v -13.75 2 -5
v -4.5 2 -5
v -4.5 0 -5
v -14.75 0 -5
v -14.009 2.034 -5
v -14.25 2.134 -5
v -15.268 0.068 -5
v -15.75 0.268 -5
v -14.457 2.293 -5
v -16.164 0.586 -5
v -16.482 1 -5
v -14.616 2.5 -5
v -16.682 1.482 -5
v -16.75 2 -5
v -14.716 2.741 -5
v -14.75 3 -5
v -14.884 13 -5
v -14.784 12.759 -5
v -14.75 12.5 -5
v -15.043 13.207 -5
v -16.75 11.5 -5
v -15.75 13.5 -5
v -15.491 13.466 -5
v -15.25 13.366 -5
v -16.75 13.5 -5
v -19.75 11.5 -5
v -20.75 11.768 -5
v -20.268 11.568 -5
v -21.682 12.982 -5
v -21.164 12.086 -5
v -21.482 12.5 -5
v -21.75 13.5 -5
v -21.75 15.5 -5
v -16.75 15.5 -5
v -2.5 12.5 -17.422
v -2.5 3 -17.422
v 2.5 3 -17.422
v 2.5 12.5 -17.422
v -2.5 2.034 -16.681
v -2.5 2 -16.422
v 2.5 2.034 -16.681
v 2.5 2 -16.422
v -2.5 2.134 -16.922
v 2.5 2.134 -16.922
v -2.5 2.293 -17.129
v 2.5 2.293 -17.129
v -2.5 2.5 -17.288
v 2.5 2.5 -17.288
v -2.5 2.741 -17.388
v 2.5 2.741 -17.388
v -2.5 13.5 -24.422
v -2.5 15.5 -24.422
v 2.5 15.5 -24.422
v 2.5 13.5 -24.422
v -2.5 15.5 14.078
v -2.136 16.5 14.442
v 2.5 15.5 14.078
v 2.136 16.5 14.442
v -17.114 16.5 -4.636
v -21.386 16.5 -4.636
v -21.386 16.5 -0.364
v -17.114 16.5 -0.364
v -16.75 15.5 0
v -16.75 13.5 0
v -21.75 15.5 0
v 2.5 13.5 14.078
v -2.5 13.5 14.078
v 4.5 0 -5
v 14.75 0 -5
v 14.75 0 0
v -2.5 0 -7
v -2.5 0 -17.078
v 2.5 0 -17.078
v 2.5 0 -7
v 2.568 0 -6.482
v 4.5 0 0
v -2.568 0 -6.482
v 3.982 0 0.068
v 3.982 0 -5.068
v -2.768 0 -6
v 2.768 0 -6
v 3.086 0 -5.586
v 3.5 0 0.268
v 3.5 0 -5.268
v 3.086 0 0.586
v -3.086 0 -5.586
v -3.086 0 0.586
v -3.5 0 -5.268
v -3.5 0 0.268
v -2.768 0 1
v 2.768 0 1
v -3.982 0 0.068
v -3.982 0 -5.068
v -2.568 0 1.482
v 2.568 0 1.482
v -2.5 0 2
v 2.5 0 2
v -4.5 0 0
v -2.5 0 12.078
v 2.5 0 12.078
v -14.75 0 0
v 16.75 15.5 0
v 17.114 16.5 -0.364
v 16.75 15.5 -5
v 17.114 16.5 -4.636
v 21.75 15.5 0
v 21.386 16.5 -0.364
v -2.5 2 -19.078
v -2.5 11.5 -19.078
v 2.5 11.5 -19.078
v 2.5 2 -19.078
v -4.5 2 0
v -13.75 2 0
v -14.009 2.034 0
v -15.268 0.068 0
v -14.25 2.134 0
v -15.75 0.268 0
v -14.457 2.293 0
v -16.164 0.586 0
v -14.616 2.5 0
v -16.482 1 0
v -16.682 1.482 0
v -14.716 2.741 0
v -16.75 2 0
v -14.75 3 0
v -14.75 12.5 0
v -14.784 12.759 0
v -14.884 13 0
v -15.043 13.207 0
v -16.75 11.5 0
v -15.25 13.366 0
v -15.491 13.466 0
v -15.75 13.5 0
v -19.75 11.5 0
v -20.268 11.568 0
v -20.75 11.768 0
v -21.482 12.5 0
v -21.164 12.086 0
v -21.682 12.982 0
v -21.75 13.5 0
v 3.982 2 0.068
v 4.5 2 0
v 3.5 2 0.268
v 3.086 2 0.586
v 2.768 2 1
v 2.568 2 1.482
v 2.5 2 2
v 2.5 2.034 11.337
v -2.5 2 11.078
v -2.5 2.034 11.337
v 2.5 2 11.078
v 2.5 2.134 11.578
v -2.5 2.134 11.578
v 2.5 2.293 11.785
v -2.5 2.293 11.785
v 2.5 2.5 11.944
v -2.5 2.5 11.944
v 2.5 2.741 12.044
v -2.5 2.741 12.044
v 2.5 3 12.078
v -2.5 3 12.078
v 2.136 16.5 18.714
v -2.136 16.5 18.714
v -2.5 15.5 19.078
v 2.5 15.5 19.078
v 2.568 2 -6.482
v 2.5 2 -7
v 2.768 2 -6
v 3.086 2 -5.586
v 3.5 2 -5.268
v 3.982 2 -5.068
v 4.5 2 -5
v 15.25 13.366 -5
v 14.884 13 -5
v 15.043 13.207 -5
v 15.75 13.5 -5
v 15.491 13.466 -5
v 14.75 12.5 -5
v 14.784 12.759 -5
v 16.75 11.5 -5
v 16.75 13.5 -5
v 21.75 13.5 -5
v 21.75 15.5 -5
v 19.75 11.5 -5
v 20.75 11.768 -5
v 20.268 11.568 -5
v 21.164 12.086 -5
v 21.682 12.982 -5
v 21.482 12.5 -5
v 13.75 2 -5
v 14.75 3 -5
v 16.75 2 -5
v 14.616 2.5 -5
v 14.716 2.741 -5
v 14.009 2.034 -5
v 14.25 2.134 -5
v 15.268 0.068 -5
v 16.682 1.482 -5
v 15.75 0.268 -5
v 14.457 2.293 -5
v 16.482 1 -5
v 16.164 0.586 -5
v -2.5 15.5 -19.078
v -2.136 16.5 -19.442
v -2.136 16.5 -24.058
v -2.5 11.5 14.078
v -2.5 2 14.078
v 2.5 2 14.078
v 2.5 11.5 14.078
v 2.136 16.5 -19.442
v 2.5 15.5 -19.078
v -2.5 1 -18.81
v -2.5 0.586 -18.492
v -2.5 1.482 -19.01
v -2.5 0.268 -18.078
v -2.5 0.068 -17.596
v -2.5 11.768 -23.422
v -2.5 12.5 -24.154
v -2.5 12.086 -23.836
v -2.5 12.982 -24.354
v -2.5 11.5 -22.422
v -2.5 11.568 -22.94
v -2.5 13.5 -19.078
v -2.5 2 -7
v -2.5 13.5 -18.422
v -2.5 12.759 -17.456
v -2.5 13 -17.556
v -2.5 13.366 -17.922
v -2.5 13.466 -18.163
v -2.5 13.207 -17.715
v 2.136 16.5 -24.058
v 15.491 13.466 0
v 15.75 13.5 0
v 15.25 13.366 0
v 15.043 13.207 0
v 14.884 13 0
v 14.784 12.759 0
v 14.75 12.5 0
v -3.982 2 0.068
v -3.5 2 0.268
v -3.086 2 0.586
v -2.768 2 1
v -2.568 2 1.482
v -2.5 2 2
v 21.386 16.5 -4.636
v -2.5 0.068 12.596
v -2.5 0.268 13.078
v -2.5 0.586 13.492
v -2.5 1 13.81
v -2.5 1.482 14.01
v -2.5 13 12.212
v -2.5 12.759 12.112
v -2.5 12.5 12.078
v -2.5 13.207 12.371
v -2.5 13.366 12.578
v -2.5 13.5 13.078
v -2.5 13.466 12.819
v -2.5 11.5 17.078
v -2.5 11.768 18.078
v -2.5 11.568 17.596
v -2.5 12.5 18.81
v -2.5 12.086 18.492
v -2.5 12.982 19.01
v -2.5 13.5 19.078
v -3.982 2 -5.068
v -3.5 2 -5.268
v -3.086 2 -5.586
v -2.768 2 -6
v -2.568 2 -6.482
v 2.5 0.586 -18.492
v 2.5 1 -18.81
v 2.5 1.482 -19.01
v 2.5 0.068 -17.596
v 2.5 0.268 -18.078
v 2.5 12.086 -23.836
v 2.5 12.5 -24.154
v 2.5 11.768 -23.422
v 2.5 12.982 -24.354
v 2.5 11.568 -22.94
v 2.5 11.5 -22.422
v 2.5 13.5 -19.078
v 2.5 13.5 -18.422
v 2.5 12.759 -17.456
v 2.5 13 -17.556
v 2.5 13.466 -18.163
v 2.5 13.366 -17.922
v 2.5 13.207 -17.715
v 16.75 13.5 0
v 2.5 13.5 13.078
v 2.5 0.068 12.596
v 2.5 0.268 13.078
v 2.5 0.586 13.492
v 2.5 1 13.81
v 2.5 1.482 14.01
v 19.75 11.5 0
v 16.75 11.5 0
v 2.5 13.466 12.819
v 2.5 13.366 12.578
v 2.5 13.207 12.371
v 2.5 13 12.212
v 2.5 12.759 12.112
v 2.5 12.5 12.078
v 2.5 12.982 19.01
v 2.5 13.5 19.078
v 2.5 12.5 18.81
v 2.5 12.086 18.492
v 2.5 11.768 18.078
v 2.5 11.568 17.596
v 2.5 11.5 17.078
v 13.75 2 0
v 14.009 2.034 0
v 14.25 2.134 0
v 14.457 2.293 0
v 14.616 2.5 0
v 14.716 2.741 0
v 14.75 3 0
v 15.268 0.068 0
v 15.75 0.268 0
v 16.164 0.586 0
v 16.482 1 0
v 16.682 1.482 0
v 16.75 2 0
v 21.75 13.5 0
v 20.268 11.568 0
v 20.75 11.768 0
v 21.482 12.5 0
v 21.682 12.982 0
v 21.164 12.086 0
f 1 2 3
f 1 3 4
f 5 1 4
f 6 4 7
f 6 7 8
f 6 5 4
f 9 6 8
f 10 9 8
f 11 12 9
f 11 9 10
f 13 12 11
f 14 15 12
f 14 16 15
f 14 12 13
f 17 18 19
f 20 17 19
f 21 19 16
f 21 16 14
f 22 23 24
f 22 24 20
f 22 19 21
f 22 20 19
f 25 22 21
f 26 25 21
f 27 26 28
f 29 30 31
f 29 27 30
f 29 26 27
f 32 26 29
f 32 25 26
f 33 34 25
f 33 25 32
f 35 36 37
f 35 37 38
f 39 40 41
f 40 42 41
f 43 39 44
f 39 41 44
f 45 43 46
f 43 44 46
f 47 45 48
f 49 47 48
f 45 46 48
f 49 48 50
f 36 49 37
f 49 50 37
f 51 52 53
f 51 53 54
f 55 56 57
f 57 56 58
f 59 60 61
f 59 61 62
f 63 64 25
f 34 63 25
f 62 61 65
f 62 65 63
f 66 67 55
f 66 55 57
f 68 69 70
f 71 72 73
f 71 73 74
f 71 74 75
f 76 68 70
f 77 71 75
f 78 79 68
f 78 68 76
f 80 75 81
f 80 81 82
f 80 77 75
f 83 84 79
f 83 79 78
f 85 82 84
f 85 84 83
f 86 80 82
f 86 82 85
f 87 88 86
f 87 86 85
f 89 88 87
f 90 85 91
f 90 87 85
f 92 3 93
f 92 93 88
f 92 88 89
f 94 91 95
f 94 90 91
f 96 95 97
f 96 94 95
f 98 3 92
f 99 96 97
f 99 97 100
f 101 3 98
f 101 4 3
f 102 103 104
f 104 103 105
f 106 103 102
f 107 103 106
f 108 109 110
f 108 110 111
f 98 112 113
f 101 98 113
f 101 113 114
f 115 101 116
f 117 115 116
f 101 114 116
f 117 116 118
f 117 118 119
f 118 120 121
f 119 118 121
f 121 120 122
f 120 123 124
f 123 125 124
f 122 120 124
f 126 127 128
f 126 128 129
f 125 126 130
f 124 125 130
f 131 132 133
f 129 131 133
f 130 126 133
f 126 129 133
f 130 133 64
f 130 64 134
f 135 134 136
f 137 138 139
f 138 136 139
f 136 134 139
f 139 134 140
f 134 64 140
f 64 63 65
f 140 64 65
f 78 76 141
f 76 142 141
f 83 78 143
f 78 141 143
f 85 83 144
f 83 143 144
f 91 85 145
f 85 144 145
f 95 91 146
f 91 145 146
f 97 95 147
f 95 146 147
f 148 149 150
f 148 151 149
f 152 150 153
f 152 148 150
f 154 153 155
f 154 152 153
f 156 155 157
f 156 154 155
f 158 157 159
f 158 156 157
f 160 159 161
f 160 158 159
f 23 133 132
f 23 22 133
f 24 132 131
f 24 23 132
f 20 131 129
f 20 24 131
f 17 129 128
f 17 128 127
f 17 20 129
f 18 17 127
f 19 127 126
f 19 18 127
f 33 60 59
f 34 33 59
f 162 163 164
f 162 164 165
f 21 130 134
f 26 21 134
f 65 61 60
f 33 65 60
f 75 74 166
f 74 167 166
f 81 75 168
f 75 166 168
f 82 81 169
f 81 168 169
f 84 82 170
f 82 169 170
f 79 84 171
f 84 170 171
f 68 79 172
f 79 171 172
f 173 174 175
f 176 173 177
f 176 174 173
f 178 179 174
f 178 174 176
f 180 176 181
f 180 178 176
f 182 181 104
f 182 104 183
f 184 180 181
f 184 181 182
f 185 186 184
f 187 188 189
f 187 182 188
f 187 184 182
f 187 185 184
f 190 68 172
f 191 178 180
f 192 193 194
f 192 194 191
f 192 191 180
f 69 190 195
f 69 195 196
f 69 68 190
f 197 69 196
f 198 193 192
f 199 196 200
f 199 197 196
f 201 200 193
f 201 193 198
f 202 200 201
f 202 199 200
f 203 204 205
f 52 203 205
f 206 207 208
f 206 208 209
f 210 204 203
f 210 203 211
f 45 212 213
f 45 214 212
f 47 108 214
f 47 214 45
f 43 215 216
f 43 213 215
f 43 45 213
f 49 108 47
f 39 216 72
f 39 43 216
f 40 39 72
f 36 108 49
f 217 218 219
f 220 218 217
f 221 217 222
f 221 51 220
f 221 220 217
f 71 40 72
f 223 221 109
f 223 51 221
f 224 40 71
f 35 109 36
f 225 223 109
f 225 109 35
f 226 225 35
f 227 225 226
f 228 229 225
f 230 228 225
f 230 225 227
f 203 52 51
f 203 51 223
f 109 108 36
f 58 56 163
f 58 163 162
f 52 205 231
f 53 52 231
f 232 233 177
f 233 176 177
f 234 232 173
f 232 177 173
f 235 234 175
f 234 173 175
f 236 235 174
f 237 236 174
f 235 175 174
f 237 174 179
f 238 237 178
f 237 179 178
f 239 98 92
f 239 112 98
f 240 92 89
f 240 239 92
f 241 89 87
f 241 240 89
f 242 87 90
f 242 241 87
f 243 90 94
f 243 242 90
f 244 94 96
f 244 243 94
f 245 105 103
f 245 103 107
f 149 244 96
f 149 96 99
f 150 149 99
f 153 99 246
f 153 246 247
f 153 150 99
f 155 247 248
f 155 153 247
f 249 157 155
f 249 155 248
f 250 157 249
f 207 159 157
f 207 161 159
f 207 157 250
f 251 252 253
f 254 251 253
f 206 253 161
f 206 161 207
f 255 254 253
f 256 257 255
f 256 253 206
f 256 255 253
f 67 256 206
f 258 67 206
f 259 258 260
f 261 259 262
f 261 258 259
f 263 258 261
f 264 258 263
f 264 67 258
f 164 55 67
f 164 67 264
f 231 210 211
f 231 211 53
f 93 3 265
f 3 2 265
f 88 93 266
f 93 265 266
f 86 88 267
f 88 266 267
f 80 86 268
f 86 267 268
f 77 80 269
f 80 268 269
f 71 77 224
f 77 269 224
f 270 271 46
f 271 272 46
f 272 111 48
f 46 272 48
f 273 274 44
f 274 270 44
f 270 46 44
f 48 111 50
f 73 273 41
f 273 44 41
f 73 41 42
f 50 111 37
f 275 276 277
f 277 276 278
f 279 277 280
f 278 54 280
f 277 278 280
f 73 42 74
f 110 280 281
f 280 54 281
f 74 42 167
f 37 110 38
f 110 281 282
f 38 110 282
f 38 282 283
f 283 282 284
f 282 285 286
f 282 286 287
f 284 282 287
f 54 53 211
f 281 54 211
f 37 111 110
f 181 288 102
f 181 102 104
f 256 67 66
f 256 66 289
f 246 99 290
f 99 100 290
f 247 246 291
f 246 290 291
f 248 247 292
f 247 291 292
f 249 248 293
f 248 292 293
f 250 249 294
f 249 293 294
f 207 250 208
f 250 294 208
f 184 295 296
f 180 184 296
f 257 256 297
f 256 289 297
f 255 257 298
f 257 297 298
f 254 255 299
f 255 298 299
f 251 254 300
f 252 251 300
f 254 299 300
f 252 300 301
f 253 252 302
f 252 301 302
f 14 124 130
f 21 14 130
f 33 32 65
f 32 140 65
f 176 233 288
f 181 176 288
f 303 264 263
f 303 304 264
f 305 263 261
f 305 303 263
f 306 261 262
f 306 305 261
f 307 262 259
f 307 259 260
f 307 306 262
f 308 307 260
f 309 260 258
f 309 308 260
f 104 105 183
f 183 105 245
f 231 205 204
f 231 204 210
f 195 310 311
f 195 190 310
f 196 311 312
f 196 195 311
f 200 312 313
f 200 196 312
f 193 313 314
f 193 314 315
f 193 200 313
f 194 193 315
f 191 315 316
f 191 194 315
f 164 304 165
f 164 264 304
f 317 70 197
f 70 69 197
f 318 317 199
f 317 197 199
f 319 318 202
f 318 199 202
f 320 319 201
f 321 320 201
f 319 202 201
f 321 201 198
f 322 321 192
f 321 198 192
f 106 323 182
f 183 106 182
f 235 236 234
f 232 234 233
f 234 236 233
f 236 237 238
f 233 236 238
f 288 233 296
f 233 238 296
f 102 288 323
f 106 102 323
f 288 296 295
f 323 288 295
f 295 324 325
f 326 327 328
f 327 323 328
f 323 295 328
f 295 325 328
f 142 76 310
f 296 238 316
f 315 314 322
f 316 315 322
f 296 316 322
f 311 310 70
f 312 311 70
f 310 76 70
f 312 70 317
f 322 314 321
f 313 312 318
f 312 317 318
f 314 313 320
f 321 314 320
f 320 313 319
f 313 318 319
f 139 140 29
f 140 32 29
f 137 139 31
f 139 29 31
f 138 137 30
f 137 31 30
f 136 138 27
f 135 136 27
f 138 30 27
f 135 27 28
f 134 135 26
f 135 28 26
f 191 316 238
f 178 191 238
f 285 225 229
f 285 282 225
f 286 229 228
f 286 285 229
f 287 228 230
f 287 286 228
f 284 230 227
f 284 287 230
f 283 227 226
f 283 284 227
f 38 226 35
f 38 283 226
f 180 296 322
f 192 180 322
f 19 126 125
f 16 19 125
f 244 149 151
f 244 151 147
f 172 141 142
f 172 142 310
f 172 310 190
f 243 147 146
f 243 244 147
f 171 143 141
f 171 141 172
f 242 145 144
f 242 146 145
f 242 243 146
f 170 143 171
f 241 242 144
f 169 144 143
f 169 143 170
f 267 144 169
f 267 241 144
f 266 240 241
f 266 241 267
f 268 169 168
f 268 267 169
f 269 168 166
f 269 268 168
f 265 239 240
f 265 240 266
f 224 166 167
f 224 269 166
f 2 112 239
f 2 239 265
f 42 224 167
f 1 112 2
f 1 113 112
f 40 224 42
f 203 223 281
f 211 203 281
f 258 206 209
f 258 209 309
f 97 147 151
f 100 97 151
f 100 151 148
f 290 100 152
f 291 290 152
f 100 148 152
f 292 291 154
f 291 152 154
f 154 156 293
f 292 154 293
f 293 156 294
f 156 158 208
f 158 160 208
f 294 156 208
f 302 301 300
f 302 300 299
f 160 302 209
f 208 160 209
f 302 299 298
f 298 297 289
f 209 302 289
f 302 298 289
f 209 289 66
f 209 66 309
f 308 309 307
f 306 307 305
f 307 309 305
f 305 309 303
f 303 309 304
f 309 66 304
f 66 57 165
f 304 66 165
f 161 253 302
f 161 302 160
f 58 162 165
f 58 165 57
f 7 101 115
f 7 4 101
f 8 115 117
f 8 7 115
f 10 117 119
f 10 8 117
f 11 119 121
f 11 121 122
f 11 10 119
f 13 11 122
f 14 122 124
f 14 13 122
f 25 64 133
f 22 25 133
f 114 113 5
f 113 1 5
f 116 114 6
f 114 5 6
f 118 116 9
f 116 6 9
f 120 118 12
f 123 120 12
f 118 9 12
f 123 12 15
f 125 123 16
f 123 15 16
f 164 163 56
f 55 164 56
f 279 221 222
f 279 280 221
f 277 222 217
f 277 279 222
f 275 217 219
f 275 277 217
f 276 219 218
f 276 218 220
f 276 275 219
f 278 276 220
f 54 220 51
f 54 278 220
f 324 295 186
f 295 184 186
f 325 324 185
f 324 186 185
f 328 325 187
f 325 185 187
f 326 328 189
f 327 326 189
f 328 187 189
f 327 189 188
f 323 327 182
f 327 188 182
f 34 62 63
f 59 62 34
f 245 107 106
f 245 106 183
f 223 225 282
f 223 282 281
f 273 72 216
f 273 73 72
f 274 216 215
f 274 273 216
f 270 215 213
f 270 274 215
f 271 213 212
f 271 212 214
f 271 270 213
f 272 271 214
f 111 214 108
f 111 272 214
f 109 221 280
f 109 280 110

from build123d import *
from OCP.BRepFilletAPI import BRepFilletAPI_MakeChamfer

# Parameters (mm, degrees)
BOSS_EXTRUDE1_DEPTH      = 5
BOSS_EXTRUDE2_DEPTH      = 2.5
BOSS_EXTRUDE2_DEPTH_BACK = 2.5
SKETCH6_W                = 5
SKETCH6_H                = 5
SKETCH6_H_2              = 5.343869798
BOSS_EXTRUDE3_DEPTH      = 3
FILLET1_R                = 1
FILLET2_R                = 2
CHAMFER1_SIZE            = 1
CHAMFER1_SIZE2           = 0.363970234
FILLET3_R                = 1


with BuildPart() as part:
    # Sketch1 → Boss-Extrude1 (new body)
    with BuildSketch(Plane.XY):
        Polygon((16.75, 0), (-16.75, 0), (-16.75, 11.5), (-21.75, 11.5), (-21.75, 13.5), (-14.75, 13.5), (-14.75, 2), (14.75, 2), (14.75, 13.5), (21.75, 13.5), (21.75, 11.5), (16.75, 11.5), align=None)
    extrude(amount=-BOSS_EXTRUDE1_DEPTH)

    # Sketch5 → Boss-Extrude2 (add, two sides: drawn at the far end of the back side and taken through both)
    with BuildSketch(Plane(origin=(0, 0, 0), x_dir=(0, 0, -1), z_dir=(1, 0, 0)).offset(-BOSS_EXTRUDE2_DEPTH_BACK)):
        Polygon((19.078065101, 0), (-14.078065101, 0), (-14.078065101, 11.5), (-19.078065101, 11.5), (-19.078065101, 13.5), (-12.078065101, 13.5), (-12.078065101, 2), (17.421934899, 2), (17.421934899, 13.5), (24.421934899, 13.5), (24.421934899, 11.5), (19.078065101, 11.5), align=None)
    extrude(amount=BOSS_EXTRUDE2_DEPTH + BOSS_EXTRUDE2_DEPTH_BACK)

    # Sketch6 → Boss-Extrude3 (add)
    with BuildSketch(Plane(origin=(0, 13.5, 0), x_dir=(1, 0, 0), z_dir=(0, 1, 0))):
        with Locations((19.25, 2.5)):
            Rectangle(SKETCH6_W, SKETCH6_H)
        with Locations((0, -16.578065101)):
            Rectangle(SKETCH6_W, SKETCH6_H)
        with Locations((-19.25, 2.5)):
            Rectangle(SKETCH6_W, SKETCH6_H)
        with Locations((0, 21.75)):
            Rectangle(SKETCH6_W, SKETCH6_H_2)
    extrude(amount=BOSS_EXTRUDE3_DEPTH)

    # Fillet1
    fillet1_edges = [part.edges().sort_by_distance(p)[0] for p in [
        (-14.75, 2, -2.5),
        (14.75, 2, -2.5),
        (0, 2, 12.078065101),
        (0, 2, -17.421934899),
    ]]
    fillet(fillet1_edges, radius=FILLET1_R)

    # Fillet2
    fillet2_edges = [part.edges().sort_by_distance(p)[0] for p in [
        (-21.75, 11.5, -2.5),
        (21.75, 11.5, -2.5),
        (16.75, 0, -2.5),
        (-16.75, 0, -2.5),
        (2.5, 1, 0),
        (-2.5, 1, 0),
        (0, 0, -19.078065101),
        (-2.5, 1, -5),
        (2.5, 1, -5),
        (0, 0, 14.078065101),
        (0, 11.5, 19.078065101),
        (0, 11.5, -24.421934899),
    ]]
    fillet(fillet2_edges, radius=FILLET2_R)

    # Chamfer1: one chamfer whose edges measure the first distance from different faces: ONE call of the kernel's chamfer builder (chamfer() names one face for all edges)
    chamfer1_edges_1 = [part.edges().sort_by_distance(p)[0] for p in [
        (-16.75, 16.5, -2.5),
    ]]
    chamfer1_side_1 = [part.faces().sort_by_distance(p)[0] for p in [
        (-16.75, 15, -2.5),
    ]]
    chamfer1_edges_2 = [part.edges().sort_by_distance(p)[0] for p in [
        (-19.25, 16.5, -5),
    ]]
    chamfer1_side_2 = [part.faces().sort_by_distance(p)[0] for p in [
        (-15.136362203, 7.64232962, -5),
    ]]
    chamfer1_edges_3 = [part.edges().sort_by_distance(p)[0] for p in [
        (-21.75, 16.5, -2.5),
    ]]
    chamfer1_side_3 = [part.faces().sort_by_distance(p)[0] for p in [
        (-21.75, 15, -2.5),
    ]]
    chamfer1_edges_4 = [part.edges().sort_by_distance(p)[0] for p in [
        (-19.25, 16.5, 0),
    ]]
    chamfer1_side_4 = [part.faces().sort_by_distance(p)[0] for p in [
        (-15.136362203, 7.64232962, 0),
    ]]
    chamfer1_edges_5 = [part.edges().sort_by_distance(p)[0] for p in [
        (-2.5, 16.5, -21.75),
    ]]
    chamfer1_side_5 = [part.faces().sort_by_distance(p)[0] for p in [
        (-2.5, 7.829257404, -17.697130979),
    ]]
    chamfer1_edges_6 = [part.edges().sort_by_distance(p)[0] for p in [
        (0, 16.5, -19.078065101),
    ]]
    chamfer1_side_6 = [part.faces().sort_by_distance(p)[0] for p in [
        (0, 15, -19.078065101),
    ]]
    chamfer1_edges_7 = [part.edges().sort_by_distance(p)[0] for p in [
        (2.5, 16.5, -21.75),
    ]]
    chamfer1_side_7 = [part.faces().sort_by_distance(p)[0] for p in [
        (2.5, 7.829257404, -17.697130979),
    ]]
    chamfer1_edges_8 = [part.edges().sort_by_distance(p)[0] for p in [
        (0, 16.5, -24.421934899),
    ]]
    chamfer1_side_8 = [part.faces().sort_by_distance(p)[0] for p in [
        (0, 15, -24.421934899),
    ]]
    chamfer1_edges_9 = [part.edges().sort_by_distance(p)[0] for p in [
        (21.75, 16.5, -2.5),
    ]]
    chamfer1_side_9 = [part.faces().sort_by_distance(p)[0] for p in [
        (21.75, 15, -2.5),
    ]]
    chamfer1_edges_10 = [part.edges().sort_by_distance(p)[0] for p in [
        (19.25, 16.5, -5),
    ]]
    chamfer1_side_10 = [part.faces().sort_by_distance(p)[0] for p in [
        (15.136362203, 7.64232962, -5),
    ]]
    chamfer1_edges_11 = [part.edges().sort_by_distance(p)[0] for p in [
        (16.75, 16.5, -2.5),
    ]]
    chamfer1_side_11 = [part.faces().sort_by_distance(p)[0] for p in [
        (16.75, 15, -2.5),
    ]]
    chamfer1_edges_12 = [part.edges().sort_by_distance(p)[0] for p in [
        (19.25, 16.5, 0),
    ]]
    chamfer1_side_12 = [part.faces().sort_by_distance(p)[0] for p in [
        (15.136362203, 7.64232962, 0),
    ]]
    chamfer1_edges_13 = [part.edges().sort_by_distance(p)[0] for p in [
        (-2.5, 16.5, 16.578065101),
    ]]
    chamfer1_side_13 = [part.faces().sort_by_distance(p)[0] for p in [
        (-2.5, 7.674657573, 12.515775654),
    ]]
    chamfer1_edges_14 = [part.edges().sort_by_distance(p)[0] for p in [
        (0, 16.5, 19.078065101),
    ]]
    chamfer1_side_14 = [part.faces().sort_by_distance(p)[0] for p in [
        (0, 15, 19.078065101),
    ]]
    chamfer1_edges_15 = [part.edges().sort_by_distance(p)[0] for p in [
        (2.5, 16.5, 16.578065101),
    ]]
    chamfer1_side_15 = [part.faces().sort_by_distance(p)[0] for p in [
        (2.5, 7.674657573, 12.515775654),
    ]]
    chamfer1_edges_16 = [part.edges().sort_by_distance(p)[0] for p in [
        (0, 16.5, 14.078065101),
    ]]
    chamfer1_side_16 = [part.faces().sort_by_distance(p)[0] for p in [
        (0, 15, 14.078065101),
    ]]
    chamfer1 = BRepFilletAPI_MakeChamfer(part.part.solid().wrapped)
    for e in chamfer1_edges_1:
        chamfer1.Add(CHAMFER1_SIZE, CHAMFER1_SIZE2, e.wrapped, chamfer1_side_1[0].wrapped)  # the first distance lies on this face
    for e in chamfer1_edges_2:
        chamfer1.Add(CHAMFER1_SIZE, CHAMFER1_SIZE2, e.wrapped, chamfer1_side_2[0].wrapped)  # the first distance lies on this face
    for e in chamfer1_edges_3:
        chamfer1.Add(CHAMFER1_SIZE, CHAMFER1_SIZE2, e.wrapped, chamfer1_side_3[0].wrapped)  # the first distance lies on this face
    for e in chamfer1_edges_4:
        chamfer1.Add(CHAMFER1_SIZE, CHAMFER1_SIZE2, e.wrapped, chamfer1_side_4[0].wrapped)  # the first distance lies on this face
    for e in chamfer1_edges_5:
        chamfer1.Add(CHAMFER1_SIZE, CHAMFER1_SIZE2, e.wrapped, chamfer1_side_5[0].wrapped)  # the first distance lies on this face
    for e in chamfer1_edges_6:
        chamfer1.Add(CHAMFER1_SIZE, CHAMFER1_SIZE2, e.wrapped, chamfer1_side_6[0].wrapped)  # the first distance lies on this face
    for e in chamfer1_edges_7:
        chamfer1.Add(CHAMFER1_SIZE, CHAMFER1_SIZE2, e.wrapped, chamfer1_side_7[0].wrapped)  # the first distance lies on this face
    for e in chamfer1_edges_8:
        chamfer1.Add(CHAMFER1_SIZE, CHAMFER1_SIZE2, e.wrapped, chamfer1_side_8[0].wrapped)  # the first distance lies on this face
    for e in chamfer1_edges_9:
        chamfer1.Add(CHAMFER1_SIZE, CHAMFER1_SIZE2, e.wrapped, chamfer1_side_9[0].wrapped)  # the first distance lies on this face
    for e in chamfer1_edges_10:
        chamfer1.Add(CHAMFER1_SIZE, CHAMFER1_SIZE2, e.wrapped, chamfer1_side_10[0].wrapped)  # the first distance lies on this face
    for e in chamfer1_edges_11:
        chamfer1.Add(CHAMFER1_SIZE, CHAMFER1_SIZE2, e.wrapped, chamfer1_side_11[0].wrapped)  # the first distance lies on this face
    for e in chamfer1_edges_12:
        chamfer1.Add(CHAMFER1_SIZE, CHAMFER1_SIZE2, e.wrapped, chamfer1_side_12[0].wrapped)  # the first distance lies on this face
    for e in chamfer1_edges_13:
        chamfer1.Add(CHAMFER1_SIZE, CHAMFER1_SIZE2, e.wrapped, chamfer1_side_13[0].wrapped)  # the first distance lies on this face
    for e in chamfer1_edges_14:
        chamfer1.Add(CHAMFER1_SIZE, CHAMFER1_SIZE2, e.wrapped, chamfer1_side_14[0].wrapped)  # the first distance lies on this face
    for e in chamfer1_edges_15:
        chamfer1.Add(CHAMFER1_SIZE, CHAMFER1_SIZE2, e.wrapped, chamfer1_side_15[0].wrapped)  # the first distance lies on this face
    for e in chamfer1_edges_16:
        chamfer1.Add(CHAMFER1_SIZE, CHAMFER1_SIZE2, e.wrapped, chamfer1_side_16[0].wrapped)  # the first distance lies on this face
    add(Compound.cast(chamfer1.Shape()), mode=Mode.REPLACE)

    # Fillet3
    fillet3_edges = [part.edges().sort_by_distance(p)[0] for p in [
        (-14.75, 13.5, -2.5),
        (14.75, 13.5, -2.5),
        (0, 13.5, 12.078065101),
        (0, 13.5, -17.421934899),
    ]]
    fillet(fillet3_edges, radius=FILLET3_R)


solid = part.part
